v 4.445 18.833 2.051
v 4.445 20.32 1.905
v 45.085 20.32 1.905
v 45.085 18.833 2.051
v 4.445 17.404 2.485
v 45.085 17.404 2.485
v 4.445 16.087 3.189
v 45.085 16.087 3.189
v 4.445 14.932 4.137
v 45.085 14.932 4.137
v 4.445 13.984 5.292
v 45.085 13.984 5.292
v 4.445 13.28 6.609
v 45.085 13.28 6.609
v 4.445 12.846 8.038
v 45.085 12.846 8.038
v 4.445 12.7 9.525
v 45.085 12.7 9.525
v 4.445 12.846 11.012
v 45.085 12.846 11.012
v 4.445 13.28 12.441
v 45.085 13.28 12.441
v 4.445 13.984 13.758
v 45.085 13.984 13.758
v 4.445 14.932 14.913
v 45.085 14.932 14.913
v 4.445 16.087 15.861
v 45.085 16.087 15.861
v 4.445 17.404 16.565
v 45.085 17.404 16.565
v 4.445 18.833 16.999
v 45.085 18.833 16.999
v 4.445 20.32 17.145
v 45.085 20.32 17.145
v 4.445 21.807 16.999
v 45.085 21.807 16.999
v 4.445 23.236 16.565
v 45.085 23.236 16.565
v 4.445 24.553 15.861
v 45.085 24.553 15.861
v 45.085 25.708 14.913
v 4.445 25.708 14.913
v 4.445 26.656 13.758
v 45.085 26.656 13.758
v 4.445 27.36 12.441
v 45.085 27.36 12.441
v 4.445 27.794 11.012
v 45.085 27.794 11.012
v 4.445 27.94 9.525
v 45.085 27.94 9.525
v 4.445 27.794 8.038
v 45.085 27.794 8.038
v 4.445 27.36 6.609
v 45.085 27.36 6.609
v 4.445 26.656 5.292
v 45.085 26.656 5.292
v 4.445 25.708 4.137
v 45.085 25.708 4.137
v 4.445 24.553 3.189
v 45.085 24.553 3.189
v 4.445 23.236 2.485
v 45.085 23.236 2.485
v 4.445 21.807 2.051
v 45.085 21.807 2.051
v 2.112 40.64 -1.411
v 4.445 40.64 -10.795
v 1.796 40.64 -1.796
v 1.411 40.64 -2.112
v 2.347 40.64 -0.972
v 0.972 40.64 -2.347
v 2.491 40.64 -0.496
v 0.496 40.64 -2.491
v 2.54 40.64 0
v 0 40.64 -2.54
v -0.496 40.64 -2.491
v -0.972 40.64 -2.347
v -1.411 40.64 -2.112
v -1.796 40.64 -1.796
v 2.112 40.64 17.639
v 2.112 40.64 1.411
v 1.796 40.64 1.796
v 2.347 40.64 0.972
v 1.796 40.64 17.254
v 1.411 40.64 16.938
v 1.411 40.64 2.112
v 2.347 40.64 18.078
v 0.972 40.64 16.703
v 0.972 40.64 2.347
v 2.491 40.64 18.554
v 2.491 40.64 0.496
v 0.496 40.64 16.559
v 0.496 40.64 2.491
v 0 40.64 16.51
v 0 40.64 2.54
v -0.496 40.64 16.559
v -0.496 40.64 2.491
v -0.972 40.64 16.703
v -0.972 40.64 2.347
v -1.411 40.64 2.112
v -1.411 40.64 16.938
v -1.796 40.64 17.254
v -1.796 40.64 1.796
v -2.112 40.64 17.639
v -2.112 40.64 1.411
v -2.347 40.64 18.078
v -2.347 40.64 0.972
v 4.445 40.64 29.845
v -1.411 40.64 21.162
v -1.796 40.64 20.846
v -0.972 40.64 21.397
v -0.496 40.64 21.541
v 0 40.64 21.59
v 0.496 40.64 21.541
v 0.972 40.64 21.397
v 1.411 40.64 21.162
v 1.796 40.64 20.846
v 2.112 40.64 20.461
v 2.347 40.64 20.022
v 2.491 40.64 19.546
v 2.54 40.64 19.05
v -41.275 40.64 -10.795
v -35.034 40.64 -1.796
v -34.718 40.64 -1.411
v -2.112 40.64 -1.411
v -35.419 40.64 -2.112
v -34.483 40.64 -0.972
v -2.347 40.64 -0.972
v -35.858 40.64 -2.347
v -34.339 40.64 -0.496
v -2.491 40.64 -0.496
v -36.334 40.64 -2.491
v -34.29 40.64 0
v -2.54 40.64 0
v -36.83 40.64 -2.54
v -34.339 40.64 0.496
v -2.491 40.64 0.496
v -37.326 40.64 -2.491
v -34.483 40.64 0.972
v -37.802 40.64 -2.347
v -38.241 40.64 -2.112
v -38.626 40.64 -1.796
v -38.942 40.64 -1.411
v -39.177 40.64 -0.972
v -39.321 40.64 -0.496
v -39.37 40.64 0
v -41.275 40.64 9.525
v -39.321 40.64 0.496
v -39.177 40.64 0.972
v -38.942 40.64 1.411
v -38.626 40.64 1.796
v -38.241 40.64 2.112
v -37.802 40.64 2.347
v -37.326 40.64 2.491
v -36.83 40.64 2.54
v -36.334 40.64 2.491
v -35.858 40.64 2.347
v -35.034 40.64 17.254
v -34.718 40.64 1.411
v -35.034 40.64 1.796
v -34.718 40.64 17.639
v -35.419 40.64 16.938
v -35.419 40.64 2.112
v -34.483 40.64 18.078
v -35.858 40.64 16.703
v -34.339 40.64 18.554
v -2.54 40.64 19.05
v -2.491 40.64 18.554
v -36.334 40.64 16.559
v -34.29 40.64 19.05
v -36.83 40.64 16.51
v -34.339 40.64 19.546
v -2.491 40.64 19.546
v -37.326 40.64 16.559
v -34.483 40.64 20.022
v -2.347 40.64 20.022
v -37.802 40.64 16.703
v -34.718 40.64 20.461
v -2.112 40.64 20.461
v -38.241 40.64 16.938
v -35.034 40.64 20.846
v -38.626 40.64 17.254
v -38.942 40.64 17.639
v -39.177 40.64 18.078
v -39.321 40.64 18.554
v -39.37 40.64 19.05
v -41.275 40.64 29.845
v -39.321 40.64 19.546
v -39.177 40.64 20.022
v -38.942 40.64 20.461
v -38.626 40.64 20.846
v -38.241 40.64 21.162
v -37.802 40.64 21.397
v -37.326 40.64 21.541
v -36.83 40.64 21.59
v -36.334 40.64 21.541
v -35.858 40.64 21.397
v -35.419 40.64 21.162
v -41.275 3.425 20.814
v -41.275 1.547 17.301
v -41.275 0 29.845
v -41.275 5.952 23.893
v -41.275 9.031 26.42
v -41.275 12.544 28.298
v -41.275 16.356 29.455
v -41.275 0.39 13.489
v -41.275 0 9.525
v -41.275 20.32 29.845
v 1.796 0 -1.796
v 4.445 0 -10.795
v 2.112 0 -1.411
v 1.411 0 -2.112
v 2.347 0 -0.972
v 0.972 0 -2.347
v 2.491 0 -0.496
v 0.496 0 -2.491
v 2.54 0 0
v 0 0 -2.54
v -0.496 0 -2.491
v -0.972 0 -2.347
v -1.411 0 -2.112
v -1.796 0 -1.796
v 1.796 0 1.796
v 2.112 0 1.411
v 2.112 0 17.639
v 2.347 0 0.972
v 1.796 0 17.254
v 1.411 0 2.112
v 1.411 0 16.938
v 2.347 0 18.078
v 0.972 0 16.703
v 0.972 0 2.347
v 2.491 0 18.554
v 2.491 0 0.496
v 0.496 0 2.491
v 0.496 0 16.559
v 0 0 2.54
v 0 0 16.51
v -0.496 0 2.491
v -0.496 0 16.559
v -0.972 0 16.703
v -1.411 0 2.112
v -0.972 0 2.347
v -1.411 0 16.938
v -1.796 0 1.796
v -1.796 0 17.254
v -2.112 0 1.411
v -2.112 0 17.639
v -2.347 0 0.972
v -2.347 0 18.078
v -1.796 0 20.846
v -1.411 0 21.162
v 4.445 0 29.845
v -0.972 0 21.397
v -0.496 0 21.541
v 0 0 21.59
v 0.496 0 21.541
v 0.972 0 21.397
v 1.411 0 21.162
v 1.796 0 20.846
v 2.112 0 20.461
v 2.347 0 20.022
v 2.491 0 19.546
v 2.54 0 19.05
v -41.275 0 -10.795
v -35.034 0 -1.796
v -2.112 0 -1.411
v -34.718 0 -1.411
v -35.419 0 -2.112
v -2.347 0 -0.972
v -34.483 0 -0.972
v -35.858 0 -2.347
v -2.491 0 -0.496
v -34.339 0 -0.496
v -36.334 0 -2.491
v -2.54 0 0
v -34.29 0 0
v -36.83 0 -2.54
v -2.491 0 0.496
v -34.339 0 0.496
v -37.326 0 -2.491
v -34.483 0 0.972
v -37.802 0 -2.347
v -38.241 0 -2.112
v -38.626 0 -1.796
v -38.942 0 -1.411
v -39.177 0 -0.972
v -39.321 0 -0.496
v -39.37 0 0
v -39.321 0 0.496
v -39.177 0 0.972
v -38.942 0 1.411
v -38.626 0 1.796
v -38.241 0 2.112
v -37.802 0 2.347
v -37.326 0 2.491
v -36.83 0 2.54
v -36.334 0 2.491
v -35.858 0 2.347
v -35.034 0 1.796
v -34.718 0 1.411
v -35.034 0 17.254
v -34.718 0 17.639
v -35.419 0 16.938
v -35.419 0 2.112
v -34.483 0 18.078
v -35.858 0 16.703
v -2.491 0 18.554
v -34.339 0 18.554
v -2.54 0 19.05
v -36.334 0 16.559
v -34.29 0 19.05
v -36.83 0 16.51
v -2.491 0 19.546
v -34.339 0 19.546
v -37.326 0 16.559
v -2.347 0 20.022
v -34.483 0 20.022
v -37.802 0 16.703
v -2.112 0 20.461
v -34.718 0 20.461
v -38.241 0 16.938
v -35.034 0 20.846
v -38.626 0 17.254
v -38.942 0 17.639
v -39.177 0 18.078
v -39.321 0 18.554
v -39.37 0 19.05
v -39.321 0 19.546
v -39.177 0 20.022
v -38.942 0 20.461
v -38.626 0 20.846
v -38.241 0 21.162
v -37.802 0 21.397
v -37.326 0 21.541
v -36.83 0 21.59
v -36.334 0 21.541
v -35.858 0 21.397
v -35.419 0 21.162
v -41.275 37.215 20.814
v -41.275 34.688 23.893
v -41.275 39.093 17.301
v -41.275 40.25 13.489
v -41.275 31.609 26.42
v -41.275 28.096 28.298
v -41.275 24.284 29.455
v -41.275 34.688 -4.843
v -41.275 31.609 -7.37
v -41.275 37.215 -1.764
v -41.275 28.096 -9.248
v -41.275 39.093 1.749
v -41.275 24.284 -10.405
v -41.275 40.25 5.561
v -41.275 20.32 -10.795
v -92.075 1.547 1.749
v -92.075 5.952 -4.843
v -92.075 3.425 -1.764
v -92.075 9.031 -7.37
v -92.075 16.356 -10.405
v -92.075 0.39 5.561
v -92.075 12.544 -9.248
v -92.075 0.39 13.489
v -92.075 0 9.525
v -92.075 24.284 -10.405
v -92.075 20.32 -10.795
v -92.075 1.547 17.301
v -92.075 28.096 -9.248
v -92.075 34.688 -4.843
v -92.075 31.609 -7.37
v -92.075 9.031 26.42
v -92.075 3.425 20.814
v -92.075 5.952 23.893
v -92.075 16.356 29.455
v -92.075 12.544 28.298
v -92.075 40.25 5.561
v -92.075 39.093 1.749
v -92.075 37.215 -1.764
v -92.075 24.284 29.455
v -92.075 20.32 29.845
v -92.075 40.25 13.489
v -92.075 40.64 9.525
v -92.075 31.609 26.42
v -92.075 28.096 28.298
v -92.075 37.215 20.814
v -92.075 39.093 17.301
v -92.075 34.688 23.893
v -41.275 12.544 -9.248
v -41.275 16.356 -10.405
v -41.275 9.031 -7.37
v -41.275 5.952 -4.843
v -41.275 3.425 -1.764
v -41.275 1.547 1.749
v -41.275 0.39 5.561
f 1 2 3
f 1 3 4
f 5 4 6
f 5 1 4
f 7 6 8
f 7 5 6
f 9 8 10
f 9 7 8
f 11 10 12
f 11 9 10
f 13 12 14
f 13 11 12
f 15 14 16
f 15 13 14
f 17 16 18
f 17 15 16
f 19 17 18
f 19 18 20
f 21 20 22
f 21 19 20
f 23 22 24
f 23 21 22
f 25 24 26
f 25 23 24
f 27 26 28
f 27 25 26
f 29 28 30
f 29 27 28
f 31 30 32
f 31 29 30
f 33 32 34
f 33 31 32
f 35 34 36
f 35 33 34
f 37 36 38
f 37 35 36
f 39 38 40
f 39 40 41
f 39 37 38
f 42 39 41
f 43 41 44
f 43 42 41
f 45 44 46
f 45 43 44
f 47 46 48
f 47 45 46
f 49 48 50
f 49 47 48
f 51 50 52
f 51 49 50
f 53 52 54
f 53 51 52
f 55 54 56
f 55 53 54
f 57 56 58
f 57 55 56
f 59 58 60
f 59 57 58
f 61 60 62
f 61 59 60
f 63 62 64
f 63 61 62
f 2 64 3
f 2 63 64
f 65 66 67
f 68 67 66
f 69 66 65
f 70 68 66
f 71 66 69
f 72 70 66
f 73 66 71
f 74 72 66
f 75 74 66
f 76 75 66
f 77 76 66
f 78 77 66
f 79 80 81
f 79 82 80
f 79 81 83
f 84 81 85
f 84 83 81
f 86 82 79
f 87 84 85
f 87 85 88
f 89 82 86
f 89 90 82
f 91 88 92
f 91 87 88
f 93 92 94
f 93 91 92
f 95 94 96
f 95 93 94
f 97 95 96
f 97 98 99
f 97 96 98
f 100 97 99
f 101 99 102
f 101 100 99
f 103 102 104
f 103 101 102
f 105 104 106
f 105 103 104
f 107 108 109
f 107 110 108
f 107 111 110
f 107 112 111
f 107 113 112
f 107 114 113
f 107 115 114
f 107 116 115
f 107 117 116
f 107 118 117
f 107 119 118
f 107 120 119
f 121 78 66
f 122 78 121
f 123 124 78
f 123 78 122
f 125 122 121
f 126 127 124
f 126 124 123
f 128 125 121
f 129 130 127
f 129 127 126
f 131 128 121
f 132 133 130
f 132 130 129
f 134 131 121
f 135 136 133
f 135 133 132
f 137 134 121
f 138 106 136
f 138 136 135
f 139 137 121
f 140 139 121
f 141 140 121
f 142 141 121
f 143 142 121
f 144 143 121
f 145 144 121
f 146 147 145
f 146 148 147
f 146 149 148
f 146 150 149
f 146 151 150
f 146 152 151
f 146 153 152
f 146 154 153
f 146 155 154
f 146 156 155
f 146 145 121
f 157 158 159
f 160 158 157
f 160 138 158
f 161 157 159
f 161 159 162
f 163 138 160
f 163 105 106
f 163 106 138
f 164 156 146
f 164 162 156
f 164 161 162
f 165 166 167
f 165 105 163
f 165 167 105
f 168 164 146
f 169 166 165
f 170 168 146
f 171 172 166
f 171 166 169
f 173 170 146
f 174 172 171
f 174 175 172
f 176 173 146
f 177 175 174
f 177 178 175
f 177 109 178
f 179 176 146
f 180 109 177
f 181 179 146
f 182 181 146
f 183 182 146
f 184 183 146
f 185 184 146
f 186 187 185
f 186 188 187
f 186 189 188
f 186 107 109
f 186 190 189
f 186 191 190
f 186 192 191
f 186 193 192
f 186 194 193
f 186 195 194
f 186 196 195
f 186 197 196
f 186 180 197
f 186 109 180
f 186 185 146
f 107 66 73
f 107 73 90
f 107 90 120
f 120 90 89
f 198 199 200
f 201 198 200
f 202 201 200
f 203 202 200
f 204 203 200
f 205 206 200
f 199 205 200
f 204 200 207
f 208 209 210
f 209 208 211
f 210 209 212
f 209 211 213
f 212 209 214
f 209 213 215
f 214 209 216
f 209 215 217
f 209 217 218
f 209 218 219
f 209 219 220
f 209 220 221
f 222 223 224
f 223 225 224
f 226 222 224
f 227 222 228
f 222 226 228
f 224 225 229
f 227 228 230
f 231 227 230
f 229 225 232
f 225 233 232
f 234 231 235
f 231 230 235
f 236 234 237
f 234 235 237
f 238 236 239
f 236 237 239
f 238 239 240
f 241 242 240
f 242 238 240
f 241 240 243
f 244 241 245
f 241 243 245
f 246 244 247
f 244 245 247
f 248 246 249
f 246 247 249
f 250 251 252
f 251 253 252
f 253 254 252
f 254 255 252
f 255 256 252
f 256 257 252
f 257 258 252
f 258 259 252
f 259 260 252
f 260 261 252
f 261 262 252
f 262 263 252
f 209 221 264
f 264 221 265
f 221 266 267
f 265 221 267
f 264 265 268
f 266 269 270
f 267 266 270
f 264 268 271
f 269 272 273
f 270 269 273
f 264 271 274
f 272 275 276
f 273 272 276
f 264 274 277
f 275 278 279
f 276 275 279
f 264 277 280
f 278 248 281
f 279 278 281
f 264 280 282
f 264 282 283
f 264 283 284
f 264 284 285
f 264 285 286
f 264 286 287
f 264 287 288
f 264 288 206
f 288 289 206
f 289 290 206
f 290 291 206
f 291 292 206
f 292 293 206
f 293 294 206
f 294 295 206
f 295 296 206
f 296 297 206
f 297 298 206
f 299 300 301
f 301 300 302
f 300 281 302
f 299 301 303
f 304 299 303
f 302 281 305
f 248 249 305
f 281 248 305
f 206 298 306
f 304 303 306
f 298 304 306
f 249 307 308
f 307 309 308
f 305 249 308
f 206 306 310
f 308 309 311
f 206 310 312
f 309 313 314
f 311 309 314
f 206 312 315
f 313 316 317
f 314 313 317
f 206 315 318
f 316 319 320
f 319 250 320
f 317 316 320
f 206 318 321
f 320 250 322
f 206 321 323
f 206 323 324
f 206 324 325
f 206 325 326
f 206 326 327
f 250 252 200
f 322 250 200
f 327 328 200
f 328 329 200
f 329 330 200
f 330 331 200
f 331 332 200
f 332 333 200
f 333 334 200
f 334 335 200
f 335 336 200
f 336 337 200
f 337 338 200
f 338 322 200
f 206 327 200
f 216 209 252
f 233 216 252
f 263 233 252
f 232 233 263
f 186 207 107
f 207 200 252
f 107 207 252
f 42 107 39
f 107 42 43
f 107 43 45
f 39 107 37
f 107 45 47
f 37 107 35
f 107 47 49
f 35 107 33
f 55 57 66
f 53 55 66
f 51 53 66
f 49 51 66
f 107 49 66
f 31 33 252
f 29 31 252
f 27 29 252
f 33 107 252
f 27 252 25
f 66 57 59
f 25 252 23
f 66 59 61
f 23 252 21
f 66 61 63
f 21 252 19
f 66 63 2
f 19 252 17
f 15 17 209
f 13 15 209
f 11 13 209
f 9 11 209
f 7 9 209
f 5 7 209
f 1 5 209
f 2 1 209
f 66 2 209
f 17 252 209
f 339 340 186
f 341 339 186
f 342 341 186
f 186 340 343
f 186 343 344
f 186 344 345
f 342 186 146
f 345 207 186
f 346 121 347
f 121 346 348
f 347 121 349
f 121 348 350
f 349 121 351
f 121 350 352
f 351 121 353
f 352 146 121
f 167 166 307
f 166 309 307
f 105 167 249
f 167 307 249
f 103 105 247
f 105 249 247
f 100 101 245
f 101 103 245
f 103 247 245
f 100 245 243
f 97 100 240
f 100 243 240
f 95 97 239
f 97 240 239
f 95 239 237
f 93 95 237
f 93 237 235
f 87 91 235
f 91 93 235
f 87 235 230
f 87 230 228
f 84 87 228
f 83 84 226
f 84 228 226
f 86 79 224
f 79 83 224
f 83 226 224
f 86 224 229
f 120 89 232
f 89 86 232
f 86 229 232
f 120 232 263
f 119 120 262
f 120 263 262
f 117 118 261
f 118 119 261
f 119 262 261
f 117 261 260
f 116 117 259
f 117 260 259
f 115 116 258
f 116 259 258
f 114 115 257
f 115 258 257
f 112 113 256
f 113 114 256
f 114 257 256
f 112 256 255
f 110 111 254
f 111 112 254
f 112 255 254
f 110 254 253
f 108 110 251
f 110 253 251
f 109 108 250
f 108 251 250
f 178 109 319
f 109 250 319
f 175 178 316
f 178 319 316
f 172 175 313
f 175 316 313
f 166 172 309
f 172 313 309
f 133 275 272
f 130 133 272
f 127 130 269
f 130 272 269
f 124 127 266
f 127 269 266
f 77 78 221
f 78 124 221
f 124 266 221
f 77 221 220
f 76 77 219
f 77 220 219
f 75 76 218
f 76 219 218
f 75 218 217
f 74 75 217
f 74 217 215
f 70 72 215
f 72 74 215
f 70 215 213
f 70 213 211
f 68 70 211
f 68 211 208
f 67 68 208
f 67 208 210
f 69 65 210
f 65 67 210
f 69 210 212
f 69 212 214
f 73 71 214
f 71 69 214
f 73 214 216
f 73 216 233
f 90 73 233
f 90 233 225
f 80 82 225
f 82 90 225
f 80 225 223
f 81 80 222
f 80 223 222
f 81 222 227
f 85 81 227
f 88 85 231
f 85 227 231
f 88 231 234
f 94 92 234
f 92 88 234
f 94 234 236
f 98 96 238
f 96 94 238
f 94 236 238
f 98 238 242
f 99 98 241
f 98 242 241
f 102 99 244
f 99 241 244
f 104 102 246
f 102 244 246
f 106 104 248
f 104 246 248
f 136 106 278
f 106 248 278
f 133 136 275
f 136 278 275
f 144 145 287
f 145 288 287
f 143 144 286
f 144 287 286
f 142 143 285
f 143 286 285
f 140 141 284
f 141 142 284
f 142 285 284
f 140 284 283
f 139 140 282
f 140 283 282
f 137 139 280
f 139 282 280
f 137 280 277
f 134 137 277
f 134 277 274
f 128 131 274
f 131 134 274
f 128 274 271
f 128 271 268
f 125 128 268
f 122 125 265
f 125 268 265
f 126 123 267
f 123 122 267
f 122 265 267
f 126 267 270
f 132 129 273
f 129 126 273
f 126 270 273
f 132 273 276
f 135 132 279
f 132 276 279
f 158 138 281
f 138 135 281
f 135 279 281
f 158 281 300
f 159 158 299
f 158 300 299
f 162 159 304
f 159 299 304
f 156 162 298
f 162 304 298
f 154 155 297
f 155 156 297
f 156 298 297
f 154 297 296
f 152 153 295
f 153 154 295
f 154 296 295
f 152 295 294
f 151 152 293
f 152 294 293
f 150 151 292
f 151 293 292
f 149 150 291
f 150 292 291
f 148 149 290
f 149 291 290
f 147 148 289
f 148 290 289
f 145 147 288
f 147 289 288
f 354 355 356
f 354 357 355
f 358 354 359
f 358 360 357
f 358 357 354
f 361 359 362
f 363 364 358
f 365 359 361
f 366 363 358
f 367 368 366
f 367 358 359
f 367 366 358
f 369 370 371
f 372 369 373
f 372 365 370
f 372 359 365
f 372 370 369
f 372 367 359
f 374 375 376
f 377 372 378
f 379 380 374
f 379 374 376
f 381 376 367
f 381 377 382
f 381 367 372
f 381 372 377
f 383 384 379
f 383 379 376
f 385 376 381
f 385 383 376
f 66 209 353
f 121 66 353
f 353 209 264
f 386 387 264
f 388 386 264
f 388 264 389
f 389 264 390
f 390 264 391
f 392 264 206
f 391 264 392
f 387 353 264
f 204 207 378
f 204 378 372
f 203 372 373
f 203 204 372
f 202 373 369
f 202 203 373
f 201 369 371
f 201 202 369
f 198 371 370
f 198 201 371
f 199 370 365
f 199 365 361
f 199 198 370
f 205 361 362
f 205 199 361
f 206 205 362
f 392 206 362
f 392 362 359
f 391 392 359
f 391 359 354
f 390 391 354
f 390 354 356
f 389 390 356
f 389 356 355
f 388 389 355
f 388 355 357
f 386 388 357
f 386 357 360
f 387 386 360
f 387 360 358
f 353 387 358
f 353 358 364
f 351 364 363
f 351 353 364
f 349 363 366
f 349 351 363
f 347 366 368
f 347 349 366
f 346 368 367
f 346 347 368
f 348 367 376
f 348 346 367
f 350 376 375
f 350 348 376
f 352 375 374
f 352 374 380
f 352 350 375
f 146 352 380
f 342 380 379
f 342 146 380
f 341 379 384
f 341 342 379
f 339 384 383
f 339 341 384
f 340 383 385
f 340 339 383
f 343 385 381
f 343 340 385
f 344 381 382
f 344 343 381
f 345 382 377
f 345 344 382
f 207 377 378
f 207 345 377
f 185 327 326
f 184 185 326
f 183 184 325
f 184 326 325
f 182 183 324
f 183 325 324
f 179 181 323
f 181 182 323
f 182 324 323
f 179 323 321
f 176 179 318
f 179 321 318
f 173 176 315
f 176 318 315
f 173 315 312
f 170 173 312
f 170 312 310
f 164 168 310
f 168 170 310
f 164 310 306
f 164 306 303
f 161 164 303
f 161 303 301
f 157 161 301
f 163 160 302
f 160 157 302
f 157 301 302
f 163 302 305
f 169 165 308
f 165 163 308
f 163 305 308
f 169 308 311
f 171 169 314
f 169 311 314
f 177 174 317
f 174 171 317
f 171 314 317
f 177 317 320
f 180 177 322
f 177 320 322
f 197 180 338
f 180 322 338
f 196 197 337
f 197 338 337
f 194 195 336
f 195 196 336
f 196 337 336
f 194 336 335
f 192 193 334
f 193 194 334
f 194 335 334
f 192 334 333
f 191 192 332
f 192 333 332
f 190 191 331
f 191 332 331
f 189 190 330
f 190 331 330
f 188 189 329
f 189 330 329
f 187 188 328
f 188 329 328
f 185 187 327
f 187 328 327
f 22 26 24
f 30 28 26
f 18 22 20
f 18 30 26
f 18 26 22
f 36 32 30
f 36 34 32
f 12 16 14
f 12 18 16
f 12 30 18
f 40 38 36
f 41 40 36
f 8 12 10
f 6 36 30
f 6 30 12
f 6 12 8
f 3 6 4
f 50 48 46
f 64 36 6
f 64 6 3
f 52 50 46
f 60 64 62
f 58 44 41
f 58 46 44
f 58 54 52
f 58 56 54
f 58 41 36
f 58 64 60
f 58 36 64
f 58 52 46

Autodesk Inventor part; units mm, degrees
ref_plane "YZ Plane" through (0, 0, 0) normal (1, 0, 0) x (0, 1, 0)
ref_plane "XZ Plane" through (0, 0, 0) normal (0, 1, 0) x (-1, 0, 0)
ref_plane "XY Plane" through (0, 0, 0) normal (0, 0, 1) x (1, 0, 0)
sketch "Sketch1" plane through (0, 0, 0) normal (0, 1, 0) x (-1, 0, 0)
  line L0 (41.275, 29.845) -> (-4.445, 29.845)
  line L1 (-4.445, 29.845) -> (-4.445, -10.795)
  line L2 (-4.445, -10.795) -> (41.275, -10.795)
  line L3 (41.275, -10.795) -> (41.275, 29.845)
  circle A0 centre (36.83, 19.05) radius 2.54
  circle A1 centre (36.83, 0) radius 2.54
  circle A2 centre (0, 0) radius 2.54
  circle A3 centre (0, 19.05) radius 2.54
  dimension "d1" = 19.05
  dimension "d2" = 36.83
  dimension "d20" = 40.64
  dimension "d21" = 45.72
  dimension "d22" = 10.795
  dimension "d23" = 4.445
  dimension "d24" = 19.05
  dimension "d25" = 10.795
  dimension "d26" = 36.83
  dimension "d27" = 4.445
  dimension "d28" = 4.445
  dimension "d31" = 5.08
  dimension "d32" = 5.08
  dimension "d33" = 5.08
  dimension "d34" = 5.08
extrude "Extrusion5" add sketch "Sketch1" along normal blind 40.64
sketch "Sketch4" plane through (0, 40.64, 0) normal (0, 1, 0) x (1, 0, 0)
  point P0 (0, 0)
  point P1 (-18.4878, -9.5896)
sketch "Sketch5" plane through (4.445, 0, 29.845) normal (1, 0, 0) x (0, 0, -1)
  line L0 (0, 40.64) -> (40.64, 0)
  line L1 (40.64, 40.64) -> (0, 0)
  circle A0 centre (20.32, 20.32) radius 7.62
  point P0 (29.845, 0)
  dimension "d38" = 15.24
extrude "Extrusion6" add sketch "Sketch5" along normal blind 40.64
sketch "Sketch6" plane through (-41.275, 0, -10.795) normal (-1, 0, 0) x (0, 0, 1)
  line L0 (0, 40.64) -> (40.64, 0)
  line L1 (40.64, 40.64) -> (0, 0)
  circle A0 centre (20.32, 20.32) radius 20.32
  point P0 (10.795, 0)
  dimension "d41" = 40.64
extrude "Extrusion7" add sketch "Sketch6" along normal blind 50.8
properties part number "P60 Gear Box"
